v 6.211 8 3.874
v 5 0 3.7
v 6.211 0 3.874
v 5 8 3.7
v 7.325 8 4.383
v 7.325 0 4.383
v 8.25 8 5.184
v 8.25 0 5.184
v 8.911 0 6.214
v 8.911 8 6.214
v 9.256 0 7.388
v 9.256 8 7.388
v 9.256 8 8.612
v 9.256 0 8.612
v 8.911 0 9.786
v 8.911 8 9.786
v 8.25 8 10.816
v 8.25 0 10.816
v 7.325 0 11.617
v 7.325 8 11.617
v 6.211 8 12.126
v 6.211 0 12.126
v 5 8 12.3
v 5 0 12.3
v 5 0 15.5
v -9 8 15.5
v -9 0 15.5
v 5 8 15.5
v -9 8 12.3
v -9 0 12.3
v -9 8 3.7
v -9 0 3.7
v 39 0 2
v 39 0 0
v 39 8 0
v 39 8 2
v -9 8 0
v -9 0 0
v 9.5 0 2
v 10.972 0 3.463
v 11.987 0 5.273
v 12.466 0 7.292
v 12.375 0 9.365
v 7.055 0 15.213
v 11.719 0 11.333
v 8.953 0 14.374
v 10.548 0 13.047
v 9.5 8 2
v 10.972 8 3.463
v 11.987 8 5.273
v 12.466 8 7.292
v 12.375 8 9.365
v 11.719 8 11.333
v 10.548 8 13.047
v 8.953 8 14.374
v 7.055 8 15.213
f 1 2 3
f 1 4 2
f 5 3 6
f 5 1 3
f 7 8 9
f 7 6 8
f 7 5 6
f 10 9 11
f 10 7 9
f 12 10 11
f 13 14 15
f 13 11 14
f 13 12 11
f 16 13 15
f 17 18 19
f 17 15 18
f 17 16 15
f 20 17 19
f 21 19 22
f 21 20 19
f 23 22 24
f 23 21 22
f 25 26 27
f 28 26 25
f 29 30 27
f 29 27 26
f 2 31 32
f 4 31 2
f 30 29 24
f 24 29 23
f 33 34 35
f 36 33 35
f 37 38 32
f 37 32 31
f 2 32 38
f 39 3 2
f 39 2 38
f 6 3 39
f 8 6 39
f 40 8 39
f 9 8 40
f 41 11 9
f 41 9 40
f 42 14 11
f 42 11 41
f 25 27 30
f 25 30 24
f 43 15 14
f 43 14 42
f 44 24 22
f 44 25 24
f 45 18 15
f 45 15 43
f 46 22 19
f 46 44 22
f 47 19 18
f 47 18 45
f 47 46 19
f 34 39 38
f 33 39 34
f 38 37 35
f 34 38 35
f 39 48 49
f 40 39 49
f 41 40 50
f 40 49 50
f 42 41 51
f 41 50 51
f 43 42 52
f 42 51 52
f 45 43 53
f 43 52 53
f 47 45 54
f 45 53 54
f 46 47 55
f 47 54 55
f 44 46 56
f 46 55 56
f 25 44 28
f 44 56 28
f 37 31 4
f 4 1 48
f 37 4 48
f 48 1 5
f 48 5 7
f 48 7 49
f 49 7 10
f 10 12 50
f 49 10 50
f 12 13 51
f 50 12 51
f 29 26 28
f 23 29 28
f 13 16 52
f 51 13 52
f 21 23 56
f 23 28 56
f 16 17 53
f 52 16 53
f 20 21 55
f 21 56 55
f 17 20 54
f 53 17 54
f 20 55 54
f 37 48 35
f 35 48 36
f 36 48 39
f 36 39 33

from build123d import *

# Parameters (mm, degrees)
BOX006_W               = 14
BOX006_H               = 8
BOX006_DEPTH           = 8.6
CYLINDER006_R          = 4.3
CYLINDER006_DEPTH      = 8
CYLINDER006_ROLL_ANGLE = 90
CYLINDER005_R          = 7.5
CYLINDER005_DEPTH      = 8
CYLINDER005_ROLL_ANGLE = 90
BOX005_W               = 14
BOX005_H               = 8
BOX005_DEPTH           = 8.6
BOX004_W               = 14
BOX004_H               = 8
BOX004_DEPTH           = 15.5
BOX_W                  = 48
BOX_H                  = 8
BOX_DEPTH              = 2


with BuildPart() as cubo006:
    # Box006 → Box006 (new body)
    with BuildSketch(Plane(origin=(-9, 0, 3.7), x_dir=(1, 0, 0), z_dir=(0, 0, 1))):
        with Locations((7, 4)):
            Rectangle(BOX006_W, BOX006_H)
    extrude(amount=BOX006_DEPTH)


with BuildPart() as cilindro006:
    # Cylinder006 → Cylinder006 (new body)
    with BuildSketch(Plane.XY):
        Circle(CYLINDER006_R)
    extrude(amount=CYLINDER006_DEPTH)


with BuildPart() as cilindro006_1:
    # Cylinder006 roll: moved
    add(cilindro006.part.rotate(Axis((0, 0, 0), (1, 0, 0)), CYLINDER006_ROLL_ANGLE))


with BuildPart() as cilindro006_2:
    # Cylinder006 placement: moved
    add(cilindro006_1.part.moved(Location((5, 8, 8))))


with BuildPart() as cut:
    # Cylinder005 → Cylinder005 (new body)
    with BuildSketch(Plane.XY):
        Circle(CYLINDER005_R)
    extrude(amount=CYLINDER005_DEPTH)


with BuildPart() as cut_1:
    # Cylinder005 roll: moved
    add(cut.part.rotate(Axis((0, 0, 0), (1, 0, 0)), CYLINDER005_ROLL_ANGLE))


with BuildPart() as cut_2:
    # Cylinder005 placement: moved
    add(cut_1.part.moved(Location((5, 8, 8))))

    # Cut004: cut Cilindro006
    add(cilindro006_2.part, mode=Mode.SUBTRACT)

    # Cut: cut Cubo006
    add(cubo006.part, mode=Mode.SUBTRACT)


with BuildPart() as cubo005:
    # Box005 → Box005 (new body)
    with BuildSketch(Plane(origin=(-9, 0, 3.7), x_dir=(1, 0, 0), z_dir=(0, 0, 1))):
        with Locations((7, 4)):
            Rectangle(BOX005_W, BOX005_H)
    extrude(amount=BOX005_DEPTH)


with BuildPart() as cut003:
    # Box004 → Box004 (new body)
    with BuildSketch(Plane(origin=(-9, 0, 0), x_dir=(1, 0, 0), z_dir=(0, 0, 1))):
        with Locations((7, 4)):
            Rectangle(BOX004_W, BOX004_H)
    extrude(amount=BOX004_DEPTH)

    # Cut003: cut Cubo005
    add(cubo005.part, mode=Mode.SUBTRACT)


with BuildPart() as fusion:
    # Box → Box (new body)
    with BuildSketch(Plane(origin=(-9, 0, 0), x_dir=(1, 0, 0), z_dir=(0, 0, 1))):
        with Locations((24, 4)):
            Rectangle(BOX_W, BOX_H)
    extrude(amount=BOX_DEPTH)

    # Fusion001003: union Cut003
    add(cut003.part)

    # Fusion: union Cut
    add(cut_2.part)


solid = fusion.part
